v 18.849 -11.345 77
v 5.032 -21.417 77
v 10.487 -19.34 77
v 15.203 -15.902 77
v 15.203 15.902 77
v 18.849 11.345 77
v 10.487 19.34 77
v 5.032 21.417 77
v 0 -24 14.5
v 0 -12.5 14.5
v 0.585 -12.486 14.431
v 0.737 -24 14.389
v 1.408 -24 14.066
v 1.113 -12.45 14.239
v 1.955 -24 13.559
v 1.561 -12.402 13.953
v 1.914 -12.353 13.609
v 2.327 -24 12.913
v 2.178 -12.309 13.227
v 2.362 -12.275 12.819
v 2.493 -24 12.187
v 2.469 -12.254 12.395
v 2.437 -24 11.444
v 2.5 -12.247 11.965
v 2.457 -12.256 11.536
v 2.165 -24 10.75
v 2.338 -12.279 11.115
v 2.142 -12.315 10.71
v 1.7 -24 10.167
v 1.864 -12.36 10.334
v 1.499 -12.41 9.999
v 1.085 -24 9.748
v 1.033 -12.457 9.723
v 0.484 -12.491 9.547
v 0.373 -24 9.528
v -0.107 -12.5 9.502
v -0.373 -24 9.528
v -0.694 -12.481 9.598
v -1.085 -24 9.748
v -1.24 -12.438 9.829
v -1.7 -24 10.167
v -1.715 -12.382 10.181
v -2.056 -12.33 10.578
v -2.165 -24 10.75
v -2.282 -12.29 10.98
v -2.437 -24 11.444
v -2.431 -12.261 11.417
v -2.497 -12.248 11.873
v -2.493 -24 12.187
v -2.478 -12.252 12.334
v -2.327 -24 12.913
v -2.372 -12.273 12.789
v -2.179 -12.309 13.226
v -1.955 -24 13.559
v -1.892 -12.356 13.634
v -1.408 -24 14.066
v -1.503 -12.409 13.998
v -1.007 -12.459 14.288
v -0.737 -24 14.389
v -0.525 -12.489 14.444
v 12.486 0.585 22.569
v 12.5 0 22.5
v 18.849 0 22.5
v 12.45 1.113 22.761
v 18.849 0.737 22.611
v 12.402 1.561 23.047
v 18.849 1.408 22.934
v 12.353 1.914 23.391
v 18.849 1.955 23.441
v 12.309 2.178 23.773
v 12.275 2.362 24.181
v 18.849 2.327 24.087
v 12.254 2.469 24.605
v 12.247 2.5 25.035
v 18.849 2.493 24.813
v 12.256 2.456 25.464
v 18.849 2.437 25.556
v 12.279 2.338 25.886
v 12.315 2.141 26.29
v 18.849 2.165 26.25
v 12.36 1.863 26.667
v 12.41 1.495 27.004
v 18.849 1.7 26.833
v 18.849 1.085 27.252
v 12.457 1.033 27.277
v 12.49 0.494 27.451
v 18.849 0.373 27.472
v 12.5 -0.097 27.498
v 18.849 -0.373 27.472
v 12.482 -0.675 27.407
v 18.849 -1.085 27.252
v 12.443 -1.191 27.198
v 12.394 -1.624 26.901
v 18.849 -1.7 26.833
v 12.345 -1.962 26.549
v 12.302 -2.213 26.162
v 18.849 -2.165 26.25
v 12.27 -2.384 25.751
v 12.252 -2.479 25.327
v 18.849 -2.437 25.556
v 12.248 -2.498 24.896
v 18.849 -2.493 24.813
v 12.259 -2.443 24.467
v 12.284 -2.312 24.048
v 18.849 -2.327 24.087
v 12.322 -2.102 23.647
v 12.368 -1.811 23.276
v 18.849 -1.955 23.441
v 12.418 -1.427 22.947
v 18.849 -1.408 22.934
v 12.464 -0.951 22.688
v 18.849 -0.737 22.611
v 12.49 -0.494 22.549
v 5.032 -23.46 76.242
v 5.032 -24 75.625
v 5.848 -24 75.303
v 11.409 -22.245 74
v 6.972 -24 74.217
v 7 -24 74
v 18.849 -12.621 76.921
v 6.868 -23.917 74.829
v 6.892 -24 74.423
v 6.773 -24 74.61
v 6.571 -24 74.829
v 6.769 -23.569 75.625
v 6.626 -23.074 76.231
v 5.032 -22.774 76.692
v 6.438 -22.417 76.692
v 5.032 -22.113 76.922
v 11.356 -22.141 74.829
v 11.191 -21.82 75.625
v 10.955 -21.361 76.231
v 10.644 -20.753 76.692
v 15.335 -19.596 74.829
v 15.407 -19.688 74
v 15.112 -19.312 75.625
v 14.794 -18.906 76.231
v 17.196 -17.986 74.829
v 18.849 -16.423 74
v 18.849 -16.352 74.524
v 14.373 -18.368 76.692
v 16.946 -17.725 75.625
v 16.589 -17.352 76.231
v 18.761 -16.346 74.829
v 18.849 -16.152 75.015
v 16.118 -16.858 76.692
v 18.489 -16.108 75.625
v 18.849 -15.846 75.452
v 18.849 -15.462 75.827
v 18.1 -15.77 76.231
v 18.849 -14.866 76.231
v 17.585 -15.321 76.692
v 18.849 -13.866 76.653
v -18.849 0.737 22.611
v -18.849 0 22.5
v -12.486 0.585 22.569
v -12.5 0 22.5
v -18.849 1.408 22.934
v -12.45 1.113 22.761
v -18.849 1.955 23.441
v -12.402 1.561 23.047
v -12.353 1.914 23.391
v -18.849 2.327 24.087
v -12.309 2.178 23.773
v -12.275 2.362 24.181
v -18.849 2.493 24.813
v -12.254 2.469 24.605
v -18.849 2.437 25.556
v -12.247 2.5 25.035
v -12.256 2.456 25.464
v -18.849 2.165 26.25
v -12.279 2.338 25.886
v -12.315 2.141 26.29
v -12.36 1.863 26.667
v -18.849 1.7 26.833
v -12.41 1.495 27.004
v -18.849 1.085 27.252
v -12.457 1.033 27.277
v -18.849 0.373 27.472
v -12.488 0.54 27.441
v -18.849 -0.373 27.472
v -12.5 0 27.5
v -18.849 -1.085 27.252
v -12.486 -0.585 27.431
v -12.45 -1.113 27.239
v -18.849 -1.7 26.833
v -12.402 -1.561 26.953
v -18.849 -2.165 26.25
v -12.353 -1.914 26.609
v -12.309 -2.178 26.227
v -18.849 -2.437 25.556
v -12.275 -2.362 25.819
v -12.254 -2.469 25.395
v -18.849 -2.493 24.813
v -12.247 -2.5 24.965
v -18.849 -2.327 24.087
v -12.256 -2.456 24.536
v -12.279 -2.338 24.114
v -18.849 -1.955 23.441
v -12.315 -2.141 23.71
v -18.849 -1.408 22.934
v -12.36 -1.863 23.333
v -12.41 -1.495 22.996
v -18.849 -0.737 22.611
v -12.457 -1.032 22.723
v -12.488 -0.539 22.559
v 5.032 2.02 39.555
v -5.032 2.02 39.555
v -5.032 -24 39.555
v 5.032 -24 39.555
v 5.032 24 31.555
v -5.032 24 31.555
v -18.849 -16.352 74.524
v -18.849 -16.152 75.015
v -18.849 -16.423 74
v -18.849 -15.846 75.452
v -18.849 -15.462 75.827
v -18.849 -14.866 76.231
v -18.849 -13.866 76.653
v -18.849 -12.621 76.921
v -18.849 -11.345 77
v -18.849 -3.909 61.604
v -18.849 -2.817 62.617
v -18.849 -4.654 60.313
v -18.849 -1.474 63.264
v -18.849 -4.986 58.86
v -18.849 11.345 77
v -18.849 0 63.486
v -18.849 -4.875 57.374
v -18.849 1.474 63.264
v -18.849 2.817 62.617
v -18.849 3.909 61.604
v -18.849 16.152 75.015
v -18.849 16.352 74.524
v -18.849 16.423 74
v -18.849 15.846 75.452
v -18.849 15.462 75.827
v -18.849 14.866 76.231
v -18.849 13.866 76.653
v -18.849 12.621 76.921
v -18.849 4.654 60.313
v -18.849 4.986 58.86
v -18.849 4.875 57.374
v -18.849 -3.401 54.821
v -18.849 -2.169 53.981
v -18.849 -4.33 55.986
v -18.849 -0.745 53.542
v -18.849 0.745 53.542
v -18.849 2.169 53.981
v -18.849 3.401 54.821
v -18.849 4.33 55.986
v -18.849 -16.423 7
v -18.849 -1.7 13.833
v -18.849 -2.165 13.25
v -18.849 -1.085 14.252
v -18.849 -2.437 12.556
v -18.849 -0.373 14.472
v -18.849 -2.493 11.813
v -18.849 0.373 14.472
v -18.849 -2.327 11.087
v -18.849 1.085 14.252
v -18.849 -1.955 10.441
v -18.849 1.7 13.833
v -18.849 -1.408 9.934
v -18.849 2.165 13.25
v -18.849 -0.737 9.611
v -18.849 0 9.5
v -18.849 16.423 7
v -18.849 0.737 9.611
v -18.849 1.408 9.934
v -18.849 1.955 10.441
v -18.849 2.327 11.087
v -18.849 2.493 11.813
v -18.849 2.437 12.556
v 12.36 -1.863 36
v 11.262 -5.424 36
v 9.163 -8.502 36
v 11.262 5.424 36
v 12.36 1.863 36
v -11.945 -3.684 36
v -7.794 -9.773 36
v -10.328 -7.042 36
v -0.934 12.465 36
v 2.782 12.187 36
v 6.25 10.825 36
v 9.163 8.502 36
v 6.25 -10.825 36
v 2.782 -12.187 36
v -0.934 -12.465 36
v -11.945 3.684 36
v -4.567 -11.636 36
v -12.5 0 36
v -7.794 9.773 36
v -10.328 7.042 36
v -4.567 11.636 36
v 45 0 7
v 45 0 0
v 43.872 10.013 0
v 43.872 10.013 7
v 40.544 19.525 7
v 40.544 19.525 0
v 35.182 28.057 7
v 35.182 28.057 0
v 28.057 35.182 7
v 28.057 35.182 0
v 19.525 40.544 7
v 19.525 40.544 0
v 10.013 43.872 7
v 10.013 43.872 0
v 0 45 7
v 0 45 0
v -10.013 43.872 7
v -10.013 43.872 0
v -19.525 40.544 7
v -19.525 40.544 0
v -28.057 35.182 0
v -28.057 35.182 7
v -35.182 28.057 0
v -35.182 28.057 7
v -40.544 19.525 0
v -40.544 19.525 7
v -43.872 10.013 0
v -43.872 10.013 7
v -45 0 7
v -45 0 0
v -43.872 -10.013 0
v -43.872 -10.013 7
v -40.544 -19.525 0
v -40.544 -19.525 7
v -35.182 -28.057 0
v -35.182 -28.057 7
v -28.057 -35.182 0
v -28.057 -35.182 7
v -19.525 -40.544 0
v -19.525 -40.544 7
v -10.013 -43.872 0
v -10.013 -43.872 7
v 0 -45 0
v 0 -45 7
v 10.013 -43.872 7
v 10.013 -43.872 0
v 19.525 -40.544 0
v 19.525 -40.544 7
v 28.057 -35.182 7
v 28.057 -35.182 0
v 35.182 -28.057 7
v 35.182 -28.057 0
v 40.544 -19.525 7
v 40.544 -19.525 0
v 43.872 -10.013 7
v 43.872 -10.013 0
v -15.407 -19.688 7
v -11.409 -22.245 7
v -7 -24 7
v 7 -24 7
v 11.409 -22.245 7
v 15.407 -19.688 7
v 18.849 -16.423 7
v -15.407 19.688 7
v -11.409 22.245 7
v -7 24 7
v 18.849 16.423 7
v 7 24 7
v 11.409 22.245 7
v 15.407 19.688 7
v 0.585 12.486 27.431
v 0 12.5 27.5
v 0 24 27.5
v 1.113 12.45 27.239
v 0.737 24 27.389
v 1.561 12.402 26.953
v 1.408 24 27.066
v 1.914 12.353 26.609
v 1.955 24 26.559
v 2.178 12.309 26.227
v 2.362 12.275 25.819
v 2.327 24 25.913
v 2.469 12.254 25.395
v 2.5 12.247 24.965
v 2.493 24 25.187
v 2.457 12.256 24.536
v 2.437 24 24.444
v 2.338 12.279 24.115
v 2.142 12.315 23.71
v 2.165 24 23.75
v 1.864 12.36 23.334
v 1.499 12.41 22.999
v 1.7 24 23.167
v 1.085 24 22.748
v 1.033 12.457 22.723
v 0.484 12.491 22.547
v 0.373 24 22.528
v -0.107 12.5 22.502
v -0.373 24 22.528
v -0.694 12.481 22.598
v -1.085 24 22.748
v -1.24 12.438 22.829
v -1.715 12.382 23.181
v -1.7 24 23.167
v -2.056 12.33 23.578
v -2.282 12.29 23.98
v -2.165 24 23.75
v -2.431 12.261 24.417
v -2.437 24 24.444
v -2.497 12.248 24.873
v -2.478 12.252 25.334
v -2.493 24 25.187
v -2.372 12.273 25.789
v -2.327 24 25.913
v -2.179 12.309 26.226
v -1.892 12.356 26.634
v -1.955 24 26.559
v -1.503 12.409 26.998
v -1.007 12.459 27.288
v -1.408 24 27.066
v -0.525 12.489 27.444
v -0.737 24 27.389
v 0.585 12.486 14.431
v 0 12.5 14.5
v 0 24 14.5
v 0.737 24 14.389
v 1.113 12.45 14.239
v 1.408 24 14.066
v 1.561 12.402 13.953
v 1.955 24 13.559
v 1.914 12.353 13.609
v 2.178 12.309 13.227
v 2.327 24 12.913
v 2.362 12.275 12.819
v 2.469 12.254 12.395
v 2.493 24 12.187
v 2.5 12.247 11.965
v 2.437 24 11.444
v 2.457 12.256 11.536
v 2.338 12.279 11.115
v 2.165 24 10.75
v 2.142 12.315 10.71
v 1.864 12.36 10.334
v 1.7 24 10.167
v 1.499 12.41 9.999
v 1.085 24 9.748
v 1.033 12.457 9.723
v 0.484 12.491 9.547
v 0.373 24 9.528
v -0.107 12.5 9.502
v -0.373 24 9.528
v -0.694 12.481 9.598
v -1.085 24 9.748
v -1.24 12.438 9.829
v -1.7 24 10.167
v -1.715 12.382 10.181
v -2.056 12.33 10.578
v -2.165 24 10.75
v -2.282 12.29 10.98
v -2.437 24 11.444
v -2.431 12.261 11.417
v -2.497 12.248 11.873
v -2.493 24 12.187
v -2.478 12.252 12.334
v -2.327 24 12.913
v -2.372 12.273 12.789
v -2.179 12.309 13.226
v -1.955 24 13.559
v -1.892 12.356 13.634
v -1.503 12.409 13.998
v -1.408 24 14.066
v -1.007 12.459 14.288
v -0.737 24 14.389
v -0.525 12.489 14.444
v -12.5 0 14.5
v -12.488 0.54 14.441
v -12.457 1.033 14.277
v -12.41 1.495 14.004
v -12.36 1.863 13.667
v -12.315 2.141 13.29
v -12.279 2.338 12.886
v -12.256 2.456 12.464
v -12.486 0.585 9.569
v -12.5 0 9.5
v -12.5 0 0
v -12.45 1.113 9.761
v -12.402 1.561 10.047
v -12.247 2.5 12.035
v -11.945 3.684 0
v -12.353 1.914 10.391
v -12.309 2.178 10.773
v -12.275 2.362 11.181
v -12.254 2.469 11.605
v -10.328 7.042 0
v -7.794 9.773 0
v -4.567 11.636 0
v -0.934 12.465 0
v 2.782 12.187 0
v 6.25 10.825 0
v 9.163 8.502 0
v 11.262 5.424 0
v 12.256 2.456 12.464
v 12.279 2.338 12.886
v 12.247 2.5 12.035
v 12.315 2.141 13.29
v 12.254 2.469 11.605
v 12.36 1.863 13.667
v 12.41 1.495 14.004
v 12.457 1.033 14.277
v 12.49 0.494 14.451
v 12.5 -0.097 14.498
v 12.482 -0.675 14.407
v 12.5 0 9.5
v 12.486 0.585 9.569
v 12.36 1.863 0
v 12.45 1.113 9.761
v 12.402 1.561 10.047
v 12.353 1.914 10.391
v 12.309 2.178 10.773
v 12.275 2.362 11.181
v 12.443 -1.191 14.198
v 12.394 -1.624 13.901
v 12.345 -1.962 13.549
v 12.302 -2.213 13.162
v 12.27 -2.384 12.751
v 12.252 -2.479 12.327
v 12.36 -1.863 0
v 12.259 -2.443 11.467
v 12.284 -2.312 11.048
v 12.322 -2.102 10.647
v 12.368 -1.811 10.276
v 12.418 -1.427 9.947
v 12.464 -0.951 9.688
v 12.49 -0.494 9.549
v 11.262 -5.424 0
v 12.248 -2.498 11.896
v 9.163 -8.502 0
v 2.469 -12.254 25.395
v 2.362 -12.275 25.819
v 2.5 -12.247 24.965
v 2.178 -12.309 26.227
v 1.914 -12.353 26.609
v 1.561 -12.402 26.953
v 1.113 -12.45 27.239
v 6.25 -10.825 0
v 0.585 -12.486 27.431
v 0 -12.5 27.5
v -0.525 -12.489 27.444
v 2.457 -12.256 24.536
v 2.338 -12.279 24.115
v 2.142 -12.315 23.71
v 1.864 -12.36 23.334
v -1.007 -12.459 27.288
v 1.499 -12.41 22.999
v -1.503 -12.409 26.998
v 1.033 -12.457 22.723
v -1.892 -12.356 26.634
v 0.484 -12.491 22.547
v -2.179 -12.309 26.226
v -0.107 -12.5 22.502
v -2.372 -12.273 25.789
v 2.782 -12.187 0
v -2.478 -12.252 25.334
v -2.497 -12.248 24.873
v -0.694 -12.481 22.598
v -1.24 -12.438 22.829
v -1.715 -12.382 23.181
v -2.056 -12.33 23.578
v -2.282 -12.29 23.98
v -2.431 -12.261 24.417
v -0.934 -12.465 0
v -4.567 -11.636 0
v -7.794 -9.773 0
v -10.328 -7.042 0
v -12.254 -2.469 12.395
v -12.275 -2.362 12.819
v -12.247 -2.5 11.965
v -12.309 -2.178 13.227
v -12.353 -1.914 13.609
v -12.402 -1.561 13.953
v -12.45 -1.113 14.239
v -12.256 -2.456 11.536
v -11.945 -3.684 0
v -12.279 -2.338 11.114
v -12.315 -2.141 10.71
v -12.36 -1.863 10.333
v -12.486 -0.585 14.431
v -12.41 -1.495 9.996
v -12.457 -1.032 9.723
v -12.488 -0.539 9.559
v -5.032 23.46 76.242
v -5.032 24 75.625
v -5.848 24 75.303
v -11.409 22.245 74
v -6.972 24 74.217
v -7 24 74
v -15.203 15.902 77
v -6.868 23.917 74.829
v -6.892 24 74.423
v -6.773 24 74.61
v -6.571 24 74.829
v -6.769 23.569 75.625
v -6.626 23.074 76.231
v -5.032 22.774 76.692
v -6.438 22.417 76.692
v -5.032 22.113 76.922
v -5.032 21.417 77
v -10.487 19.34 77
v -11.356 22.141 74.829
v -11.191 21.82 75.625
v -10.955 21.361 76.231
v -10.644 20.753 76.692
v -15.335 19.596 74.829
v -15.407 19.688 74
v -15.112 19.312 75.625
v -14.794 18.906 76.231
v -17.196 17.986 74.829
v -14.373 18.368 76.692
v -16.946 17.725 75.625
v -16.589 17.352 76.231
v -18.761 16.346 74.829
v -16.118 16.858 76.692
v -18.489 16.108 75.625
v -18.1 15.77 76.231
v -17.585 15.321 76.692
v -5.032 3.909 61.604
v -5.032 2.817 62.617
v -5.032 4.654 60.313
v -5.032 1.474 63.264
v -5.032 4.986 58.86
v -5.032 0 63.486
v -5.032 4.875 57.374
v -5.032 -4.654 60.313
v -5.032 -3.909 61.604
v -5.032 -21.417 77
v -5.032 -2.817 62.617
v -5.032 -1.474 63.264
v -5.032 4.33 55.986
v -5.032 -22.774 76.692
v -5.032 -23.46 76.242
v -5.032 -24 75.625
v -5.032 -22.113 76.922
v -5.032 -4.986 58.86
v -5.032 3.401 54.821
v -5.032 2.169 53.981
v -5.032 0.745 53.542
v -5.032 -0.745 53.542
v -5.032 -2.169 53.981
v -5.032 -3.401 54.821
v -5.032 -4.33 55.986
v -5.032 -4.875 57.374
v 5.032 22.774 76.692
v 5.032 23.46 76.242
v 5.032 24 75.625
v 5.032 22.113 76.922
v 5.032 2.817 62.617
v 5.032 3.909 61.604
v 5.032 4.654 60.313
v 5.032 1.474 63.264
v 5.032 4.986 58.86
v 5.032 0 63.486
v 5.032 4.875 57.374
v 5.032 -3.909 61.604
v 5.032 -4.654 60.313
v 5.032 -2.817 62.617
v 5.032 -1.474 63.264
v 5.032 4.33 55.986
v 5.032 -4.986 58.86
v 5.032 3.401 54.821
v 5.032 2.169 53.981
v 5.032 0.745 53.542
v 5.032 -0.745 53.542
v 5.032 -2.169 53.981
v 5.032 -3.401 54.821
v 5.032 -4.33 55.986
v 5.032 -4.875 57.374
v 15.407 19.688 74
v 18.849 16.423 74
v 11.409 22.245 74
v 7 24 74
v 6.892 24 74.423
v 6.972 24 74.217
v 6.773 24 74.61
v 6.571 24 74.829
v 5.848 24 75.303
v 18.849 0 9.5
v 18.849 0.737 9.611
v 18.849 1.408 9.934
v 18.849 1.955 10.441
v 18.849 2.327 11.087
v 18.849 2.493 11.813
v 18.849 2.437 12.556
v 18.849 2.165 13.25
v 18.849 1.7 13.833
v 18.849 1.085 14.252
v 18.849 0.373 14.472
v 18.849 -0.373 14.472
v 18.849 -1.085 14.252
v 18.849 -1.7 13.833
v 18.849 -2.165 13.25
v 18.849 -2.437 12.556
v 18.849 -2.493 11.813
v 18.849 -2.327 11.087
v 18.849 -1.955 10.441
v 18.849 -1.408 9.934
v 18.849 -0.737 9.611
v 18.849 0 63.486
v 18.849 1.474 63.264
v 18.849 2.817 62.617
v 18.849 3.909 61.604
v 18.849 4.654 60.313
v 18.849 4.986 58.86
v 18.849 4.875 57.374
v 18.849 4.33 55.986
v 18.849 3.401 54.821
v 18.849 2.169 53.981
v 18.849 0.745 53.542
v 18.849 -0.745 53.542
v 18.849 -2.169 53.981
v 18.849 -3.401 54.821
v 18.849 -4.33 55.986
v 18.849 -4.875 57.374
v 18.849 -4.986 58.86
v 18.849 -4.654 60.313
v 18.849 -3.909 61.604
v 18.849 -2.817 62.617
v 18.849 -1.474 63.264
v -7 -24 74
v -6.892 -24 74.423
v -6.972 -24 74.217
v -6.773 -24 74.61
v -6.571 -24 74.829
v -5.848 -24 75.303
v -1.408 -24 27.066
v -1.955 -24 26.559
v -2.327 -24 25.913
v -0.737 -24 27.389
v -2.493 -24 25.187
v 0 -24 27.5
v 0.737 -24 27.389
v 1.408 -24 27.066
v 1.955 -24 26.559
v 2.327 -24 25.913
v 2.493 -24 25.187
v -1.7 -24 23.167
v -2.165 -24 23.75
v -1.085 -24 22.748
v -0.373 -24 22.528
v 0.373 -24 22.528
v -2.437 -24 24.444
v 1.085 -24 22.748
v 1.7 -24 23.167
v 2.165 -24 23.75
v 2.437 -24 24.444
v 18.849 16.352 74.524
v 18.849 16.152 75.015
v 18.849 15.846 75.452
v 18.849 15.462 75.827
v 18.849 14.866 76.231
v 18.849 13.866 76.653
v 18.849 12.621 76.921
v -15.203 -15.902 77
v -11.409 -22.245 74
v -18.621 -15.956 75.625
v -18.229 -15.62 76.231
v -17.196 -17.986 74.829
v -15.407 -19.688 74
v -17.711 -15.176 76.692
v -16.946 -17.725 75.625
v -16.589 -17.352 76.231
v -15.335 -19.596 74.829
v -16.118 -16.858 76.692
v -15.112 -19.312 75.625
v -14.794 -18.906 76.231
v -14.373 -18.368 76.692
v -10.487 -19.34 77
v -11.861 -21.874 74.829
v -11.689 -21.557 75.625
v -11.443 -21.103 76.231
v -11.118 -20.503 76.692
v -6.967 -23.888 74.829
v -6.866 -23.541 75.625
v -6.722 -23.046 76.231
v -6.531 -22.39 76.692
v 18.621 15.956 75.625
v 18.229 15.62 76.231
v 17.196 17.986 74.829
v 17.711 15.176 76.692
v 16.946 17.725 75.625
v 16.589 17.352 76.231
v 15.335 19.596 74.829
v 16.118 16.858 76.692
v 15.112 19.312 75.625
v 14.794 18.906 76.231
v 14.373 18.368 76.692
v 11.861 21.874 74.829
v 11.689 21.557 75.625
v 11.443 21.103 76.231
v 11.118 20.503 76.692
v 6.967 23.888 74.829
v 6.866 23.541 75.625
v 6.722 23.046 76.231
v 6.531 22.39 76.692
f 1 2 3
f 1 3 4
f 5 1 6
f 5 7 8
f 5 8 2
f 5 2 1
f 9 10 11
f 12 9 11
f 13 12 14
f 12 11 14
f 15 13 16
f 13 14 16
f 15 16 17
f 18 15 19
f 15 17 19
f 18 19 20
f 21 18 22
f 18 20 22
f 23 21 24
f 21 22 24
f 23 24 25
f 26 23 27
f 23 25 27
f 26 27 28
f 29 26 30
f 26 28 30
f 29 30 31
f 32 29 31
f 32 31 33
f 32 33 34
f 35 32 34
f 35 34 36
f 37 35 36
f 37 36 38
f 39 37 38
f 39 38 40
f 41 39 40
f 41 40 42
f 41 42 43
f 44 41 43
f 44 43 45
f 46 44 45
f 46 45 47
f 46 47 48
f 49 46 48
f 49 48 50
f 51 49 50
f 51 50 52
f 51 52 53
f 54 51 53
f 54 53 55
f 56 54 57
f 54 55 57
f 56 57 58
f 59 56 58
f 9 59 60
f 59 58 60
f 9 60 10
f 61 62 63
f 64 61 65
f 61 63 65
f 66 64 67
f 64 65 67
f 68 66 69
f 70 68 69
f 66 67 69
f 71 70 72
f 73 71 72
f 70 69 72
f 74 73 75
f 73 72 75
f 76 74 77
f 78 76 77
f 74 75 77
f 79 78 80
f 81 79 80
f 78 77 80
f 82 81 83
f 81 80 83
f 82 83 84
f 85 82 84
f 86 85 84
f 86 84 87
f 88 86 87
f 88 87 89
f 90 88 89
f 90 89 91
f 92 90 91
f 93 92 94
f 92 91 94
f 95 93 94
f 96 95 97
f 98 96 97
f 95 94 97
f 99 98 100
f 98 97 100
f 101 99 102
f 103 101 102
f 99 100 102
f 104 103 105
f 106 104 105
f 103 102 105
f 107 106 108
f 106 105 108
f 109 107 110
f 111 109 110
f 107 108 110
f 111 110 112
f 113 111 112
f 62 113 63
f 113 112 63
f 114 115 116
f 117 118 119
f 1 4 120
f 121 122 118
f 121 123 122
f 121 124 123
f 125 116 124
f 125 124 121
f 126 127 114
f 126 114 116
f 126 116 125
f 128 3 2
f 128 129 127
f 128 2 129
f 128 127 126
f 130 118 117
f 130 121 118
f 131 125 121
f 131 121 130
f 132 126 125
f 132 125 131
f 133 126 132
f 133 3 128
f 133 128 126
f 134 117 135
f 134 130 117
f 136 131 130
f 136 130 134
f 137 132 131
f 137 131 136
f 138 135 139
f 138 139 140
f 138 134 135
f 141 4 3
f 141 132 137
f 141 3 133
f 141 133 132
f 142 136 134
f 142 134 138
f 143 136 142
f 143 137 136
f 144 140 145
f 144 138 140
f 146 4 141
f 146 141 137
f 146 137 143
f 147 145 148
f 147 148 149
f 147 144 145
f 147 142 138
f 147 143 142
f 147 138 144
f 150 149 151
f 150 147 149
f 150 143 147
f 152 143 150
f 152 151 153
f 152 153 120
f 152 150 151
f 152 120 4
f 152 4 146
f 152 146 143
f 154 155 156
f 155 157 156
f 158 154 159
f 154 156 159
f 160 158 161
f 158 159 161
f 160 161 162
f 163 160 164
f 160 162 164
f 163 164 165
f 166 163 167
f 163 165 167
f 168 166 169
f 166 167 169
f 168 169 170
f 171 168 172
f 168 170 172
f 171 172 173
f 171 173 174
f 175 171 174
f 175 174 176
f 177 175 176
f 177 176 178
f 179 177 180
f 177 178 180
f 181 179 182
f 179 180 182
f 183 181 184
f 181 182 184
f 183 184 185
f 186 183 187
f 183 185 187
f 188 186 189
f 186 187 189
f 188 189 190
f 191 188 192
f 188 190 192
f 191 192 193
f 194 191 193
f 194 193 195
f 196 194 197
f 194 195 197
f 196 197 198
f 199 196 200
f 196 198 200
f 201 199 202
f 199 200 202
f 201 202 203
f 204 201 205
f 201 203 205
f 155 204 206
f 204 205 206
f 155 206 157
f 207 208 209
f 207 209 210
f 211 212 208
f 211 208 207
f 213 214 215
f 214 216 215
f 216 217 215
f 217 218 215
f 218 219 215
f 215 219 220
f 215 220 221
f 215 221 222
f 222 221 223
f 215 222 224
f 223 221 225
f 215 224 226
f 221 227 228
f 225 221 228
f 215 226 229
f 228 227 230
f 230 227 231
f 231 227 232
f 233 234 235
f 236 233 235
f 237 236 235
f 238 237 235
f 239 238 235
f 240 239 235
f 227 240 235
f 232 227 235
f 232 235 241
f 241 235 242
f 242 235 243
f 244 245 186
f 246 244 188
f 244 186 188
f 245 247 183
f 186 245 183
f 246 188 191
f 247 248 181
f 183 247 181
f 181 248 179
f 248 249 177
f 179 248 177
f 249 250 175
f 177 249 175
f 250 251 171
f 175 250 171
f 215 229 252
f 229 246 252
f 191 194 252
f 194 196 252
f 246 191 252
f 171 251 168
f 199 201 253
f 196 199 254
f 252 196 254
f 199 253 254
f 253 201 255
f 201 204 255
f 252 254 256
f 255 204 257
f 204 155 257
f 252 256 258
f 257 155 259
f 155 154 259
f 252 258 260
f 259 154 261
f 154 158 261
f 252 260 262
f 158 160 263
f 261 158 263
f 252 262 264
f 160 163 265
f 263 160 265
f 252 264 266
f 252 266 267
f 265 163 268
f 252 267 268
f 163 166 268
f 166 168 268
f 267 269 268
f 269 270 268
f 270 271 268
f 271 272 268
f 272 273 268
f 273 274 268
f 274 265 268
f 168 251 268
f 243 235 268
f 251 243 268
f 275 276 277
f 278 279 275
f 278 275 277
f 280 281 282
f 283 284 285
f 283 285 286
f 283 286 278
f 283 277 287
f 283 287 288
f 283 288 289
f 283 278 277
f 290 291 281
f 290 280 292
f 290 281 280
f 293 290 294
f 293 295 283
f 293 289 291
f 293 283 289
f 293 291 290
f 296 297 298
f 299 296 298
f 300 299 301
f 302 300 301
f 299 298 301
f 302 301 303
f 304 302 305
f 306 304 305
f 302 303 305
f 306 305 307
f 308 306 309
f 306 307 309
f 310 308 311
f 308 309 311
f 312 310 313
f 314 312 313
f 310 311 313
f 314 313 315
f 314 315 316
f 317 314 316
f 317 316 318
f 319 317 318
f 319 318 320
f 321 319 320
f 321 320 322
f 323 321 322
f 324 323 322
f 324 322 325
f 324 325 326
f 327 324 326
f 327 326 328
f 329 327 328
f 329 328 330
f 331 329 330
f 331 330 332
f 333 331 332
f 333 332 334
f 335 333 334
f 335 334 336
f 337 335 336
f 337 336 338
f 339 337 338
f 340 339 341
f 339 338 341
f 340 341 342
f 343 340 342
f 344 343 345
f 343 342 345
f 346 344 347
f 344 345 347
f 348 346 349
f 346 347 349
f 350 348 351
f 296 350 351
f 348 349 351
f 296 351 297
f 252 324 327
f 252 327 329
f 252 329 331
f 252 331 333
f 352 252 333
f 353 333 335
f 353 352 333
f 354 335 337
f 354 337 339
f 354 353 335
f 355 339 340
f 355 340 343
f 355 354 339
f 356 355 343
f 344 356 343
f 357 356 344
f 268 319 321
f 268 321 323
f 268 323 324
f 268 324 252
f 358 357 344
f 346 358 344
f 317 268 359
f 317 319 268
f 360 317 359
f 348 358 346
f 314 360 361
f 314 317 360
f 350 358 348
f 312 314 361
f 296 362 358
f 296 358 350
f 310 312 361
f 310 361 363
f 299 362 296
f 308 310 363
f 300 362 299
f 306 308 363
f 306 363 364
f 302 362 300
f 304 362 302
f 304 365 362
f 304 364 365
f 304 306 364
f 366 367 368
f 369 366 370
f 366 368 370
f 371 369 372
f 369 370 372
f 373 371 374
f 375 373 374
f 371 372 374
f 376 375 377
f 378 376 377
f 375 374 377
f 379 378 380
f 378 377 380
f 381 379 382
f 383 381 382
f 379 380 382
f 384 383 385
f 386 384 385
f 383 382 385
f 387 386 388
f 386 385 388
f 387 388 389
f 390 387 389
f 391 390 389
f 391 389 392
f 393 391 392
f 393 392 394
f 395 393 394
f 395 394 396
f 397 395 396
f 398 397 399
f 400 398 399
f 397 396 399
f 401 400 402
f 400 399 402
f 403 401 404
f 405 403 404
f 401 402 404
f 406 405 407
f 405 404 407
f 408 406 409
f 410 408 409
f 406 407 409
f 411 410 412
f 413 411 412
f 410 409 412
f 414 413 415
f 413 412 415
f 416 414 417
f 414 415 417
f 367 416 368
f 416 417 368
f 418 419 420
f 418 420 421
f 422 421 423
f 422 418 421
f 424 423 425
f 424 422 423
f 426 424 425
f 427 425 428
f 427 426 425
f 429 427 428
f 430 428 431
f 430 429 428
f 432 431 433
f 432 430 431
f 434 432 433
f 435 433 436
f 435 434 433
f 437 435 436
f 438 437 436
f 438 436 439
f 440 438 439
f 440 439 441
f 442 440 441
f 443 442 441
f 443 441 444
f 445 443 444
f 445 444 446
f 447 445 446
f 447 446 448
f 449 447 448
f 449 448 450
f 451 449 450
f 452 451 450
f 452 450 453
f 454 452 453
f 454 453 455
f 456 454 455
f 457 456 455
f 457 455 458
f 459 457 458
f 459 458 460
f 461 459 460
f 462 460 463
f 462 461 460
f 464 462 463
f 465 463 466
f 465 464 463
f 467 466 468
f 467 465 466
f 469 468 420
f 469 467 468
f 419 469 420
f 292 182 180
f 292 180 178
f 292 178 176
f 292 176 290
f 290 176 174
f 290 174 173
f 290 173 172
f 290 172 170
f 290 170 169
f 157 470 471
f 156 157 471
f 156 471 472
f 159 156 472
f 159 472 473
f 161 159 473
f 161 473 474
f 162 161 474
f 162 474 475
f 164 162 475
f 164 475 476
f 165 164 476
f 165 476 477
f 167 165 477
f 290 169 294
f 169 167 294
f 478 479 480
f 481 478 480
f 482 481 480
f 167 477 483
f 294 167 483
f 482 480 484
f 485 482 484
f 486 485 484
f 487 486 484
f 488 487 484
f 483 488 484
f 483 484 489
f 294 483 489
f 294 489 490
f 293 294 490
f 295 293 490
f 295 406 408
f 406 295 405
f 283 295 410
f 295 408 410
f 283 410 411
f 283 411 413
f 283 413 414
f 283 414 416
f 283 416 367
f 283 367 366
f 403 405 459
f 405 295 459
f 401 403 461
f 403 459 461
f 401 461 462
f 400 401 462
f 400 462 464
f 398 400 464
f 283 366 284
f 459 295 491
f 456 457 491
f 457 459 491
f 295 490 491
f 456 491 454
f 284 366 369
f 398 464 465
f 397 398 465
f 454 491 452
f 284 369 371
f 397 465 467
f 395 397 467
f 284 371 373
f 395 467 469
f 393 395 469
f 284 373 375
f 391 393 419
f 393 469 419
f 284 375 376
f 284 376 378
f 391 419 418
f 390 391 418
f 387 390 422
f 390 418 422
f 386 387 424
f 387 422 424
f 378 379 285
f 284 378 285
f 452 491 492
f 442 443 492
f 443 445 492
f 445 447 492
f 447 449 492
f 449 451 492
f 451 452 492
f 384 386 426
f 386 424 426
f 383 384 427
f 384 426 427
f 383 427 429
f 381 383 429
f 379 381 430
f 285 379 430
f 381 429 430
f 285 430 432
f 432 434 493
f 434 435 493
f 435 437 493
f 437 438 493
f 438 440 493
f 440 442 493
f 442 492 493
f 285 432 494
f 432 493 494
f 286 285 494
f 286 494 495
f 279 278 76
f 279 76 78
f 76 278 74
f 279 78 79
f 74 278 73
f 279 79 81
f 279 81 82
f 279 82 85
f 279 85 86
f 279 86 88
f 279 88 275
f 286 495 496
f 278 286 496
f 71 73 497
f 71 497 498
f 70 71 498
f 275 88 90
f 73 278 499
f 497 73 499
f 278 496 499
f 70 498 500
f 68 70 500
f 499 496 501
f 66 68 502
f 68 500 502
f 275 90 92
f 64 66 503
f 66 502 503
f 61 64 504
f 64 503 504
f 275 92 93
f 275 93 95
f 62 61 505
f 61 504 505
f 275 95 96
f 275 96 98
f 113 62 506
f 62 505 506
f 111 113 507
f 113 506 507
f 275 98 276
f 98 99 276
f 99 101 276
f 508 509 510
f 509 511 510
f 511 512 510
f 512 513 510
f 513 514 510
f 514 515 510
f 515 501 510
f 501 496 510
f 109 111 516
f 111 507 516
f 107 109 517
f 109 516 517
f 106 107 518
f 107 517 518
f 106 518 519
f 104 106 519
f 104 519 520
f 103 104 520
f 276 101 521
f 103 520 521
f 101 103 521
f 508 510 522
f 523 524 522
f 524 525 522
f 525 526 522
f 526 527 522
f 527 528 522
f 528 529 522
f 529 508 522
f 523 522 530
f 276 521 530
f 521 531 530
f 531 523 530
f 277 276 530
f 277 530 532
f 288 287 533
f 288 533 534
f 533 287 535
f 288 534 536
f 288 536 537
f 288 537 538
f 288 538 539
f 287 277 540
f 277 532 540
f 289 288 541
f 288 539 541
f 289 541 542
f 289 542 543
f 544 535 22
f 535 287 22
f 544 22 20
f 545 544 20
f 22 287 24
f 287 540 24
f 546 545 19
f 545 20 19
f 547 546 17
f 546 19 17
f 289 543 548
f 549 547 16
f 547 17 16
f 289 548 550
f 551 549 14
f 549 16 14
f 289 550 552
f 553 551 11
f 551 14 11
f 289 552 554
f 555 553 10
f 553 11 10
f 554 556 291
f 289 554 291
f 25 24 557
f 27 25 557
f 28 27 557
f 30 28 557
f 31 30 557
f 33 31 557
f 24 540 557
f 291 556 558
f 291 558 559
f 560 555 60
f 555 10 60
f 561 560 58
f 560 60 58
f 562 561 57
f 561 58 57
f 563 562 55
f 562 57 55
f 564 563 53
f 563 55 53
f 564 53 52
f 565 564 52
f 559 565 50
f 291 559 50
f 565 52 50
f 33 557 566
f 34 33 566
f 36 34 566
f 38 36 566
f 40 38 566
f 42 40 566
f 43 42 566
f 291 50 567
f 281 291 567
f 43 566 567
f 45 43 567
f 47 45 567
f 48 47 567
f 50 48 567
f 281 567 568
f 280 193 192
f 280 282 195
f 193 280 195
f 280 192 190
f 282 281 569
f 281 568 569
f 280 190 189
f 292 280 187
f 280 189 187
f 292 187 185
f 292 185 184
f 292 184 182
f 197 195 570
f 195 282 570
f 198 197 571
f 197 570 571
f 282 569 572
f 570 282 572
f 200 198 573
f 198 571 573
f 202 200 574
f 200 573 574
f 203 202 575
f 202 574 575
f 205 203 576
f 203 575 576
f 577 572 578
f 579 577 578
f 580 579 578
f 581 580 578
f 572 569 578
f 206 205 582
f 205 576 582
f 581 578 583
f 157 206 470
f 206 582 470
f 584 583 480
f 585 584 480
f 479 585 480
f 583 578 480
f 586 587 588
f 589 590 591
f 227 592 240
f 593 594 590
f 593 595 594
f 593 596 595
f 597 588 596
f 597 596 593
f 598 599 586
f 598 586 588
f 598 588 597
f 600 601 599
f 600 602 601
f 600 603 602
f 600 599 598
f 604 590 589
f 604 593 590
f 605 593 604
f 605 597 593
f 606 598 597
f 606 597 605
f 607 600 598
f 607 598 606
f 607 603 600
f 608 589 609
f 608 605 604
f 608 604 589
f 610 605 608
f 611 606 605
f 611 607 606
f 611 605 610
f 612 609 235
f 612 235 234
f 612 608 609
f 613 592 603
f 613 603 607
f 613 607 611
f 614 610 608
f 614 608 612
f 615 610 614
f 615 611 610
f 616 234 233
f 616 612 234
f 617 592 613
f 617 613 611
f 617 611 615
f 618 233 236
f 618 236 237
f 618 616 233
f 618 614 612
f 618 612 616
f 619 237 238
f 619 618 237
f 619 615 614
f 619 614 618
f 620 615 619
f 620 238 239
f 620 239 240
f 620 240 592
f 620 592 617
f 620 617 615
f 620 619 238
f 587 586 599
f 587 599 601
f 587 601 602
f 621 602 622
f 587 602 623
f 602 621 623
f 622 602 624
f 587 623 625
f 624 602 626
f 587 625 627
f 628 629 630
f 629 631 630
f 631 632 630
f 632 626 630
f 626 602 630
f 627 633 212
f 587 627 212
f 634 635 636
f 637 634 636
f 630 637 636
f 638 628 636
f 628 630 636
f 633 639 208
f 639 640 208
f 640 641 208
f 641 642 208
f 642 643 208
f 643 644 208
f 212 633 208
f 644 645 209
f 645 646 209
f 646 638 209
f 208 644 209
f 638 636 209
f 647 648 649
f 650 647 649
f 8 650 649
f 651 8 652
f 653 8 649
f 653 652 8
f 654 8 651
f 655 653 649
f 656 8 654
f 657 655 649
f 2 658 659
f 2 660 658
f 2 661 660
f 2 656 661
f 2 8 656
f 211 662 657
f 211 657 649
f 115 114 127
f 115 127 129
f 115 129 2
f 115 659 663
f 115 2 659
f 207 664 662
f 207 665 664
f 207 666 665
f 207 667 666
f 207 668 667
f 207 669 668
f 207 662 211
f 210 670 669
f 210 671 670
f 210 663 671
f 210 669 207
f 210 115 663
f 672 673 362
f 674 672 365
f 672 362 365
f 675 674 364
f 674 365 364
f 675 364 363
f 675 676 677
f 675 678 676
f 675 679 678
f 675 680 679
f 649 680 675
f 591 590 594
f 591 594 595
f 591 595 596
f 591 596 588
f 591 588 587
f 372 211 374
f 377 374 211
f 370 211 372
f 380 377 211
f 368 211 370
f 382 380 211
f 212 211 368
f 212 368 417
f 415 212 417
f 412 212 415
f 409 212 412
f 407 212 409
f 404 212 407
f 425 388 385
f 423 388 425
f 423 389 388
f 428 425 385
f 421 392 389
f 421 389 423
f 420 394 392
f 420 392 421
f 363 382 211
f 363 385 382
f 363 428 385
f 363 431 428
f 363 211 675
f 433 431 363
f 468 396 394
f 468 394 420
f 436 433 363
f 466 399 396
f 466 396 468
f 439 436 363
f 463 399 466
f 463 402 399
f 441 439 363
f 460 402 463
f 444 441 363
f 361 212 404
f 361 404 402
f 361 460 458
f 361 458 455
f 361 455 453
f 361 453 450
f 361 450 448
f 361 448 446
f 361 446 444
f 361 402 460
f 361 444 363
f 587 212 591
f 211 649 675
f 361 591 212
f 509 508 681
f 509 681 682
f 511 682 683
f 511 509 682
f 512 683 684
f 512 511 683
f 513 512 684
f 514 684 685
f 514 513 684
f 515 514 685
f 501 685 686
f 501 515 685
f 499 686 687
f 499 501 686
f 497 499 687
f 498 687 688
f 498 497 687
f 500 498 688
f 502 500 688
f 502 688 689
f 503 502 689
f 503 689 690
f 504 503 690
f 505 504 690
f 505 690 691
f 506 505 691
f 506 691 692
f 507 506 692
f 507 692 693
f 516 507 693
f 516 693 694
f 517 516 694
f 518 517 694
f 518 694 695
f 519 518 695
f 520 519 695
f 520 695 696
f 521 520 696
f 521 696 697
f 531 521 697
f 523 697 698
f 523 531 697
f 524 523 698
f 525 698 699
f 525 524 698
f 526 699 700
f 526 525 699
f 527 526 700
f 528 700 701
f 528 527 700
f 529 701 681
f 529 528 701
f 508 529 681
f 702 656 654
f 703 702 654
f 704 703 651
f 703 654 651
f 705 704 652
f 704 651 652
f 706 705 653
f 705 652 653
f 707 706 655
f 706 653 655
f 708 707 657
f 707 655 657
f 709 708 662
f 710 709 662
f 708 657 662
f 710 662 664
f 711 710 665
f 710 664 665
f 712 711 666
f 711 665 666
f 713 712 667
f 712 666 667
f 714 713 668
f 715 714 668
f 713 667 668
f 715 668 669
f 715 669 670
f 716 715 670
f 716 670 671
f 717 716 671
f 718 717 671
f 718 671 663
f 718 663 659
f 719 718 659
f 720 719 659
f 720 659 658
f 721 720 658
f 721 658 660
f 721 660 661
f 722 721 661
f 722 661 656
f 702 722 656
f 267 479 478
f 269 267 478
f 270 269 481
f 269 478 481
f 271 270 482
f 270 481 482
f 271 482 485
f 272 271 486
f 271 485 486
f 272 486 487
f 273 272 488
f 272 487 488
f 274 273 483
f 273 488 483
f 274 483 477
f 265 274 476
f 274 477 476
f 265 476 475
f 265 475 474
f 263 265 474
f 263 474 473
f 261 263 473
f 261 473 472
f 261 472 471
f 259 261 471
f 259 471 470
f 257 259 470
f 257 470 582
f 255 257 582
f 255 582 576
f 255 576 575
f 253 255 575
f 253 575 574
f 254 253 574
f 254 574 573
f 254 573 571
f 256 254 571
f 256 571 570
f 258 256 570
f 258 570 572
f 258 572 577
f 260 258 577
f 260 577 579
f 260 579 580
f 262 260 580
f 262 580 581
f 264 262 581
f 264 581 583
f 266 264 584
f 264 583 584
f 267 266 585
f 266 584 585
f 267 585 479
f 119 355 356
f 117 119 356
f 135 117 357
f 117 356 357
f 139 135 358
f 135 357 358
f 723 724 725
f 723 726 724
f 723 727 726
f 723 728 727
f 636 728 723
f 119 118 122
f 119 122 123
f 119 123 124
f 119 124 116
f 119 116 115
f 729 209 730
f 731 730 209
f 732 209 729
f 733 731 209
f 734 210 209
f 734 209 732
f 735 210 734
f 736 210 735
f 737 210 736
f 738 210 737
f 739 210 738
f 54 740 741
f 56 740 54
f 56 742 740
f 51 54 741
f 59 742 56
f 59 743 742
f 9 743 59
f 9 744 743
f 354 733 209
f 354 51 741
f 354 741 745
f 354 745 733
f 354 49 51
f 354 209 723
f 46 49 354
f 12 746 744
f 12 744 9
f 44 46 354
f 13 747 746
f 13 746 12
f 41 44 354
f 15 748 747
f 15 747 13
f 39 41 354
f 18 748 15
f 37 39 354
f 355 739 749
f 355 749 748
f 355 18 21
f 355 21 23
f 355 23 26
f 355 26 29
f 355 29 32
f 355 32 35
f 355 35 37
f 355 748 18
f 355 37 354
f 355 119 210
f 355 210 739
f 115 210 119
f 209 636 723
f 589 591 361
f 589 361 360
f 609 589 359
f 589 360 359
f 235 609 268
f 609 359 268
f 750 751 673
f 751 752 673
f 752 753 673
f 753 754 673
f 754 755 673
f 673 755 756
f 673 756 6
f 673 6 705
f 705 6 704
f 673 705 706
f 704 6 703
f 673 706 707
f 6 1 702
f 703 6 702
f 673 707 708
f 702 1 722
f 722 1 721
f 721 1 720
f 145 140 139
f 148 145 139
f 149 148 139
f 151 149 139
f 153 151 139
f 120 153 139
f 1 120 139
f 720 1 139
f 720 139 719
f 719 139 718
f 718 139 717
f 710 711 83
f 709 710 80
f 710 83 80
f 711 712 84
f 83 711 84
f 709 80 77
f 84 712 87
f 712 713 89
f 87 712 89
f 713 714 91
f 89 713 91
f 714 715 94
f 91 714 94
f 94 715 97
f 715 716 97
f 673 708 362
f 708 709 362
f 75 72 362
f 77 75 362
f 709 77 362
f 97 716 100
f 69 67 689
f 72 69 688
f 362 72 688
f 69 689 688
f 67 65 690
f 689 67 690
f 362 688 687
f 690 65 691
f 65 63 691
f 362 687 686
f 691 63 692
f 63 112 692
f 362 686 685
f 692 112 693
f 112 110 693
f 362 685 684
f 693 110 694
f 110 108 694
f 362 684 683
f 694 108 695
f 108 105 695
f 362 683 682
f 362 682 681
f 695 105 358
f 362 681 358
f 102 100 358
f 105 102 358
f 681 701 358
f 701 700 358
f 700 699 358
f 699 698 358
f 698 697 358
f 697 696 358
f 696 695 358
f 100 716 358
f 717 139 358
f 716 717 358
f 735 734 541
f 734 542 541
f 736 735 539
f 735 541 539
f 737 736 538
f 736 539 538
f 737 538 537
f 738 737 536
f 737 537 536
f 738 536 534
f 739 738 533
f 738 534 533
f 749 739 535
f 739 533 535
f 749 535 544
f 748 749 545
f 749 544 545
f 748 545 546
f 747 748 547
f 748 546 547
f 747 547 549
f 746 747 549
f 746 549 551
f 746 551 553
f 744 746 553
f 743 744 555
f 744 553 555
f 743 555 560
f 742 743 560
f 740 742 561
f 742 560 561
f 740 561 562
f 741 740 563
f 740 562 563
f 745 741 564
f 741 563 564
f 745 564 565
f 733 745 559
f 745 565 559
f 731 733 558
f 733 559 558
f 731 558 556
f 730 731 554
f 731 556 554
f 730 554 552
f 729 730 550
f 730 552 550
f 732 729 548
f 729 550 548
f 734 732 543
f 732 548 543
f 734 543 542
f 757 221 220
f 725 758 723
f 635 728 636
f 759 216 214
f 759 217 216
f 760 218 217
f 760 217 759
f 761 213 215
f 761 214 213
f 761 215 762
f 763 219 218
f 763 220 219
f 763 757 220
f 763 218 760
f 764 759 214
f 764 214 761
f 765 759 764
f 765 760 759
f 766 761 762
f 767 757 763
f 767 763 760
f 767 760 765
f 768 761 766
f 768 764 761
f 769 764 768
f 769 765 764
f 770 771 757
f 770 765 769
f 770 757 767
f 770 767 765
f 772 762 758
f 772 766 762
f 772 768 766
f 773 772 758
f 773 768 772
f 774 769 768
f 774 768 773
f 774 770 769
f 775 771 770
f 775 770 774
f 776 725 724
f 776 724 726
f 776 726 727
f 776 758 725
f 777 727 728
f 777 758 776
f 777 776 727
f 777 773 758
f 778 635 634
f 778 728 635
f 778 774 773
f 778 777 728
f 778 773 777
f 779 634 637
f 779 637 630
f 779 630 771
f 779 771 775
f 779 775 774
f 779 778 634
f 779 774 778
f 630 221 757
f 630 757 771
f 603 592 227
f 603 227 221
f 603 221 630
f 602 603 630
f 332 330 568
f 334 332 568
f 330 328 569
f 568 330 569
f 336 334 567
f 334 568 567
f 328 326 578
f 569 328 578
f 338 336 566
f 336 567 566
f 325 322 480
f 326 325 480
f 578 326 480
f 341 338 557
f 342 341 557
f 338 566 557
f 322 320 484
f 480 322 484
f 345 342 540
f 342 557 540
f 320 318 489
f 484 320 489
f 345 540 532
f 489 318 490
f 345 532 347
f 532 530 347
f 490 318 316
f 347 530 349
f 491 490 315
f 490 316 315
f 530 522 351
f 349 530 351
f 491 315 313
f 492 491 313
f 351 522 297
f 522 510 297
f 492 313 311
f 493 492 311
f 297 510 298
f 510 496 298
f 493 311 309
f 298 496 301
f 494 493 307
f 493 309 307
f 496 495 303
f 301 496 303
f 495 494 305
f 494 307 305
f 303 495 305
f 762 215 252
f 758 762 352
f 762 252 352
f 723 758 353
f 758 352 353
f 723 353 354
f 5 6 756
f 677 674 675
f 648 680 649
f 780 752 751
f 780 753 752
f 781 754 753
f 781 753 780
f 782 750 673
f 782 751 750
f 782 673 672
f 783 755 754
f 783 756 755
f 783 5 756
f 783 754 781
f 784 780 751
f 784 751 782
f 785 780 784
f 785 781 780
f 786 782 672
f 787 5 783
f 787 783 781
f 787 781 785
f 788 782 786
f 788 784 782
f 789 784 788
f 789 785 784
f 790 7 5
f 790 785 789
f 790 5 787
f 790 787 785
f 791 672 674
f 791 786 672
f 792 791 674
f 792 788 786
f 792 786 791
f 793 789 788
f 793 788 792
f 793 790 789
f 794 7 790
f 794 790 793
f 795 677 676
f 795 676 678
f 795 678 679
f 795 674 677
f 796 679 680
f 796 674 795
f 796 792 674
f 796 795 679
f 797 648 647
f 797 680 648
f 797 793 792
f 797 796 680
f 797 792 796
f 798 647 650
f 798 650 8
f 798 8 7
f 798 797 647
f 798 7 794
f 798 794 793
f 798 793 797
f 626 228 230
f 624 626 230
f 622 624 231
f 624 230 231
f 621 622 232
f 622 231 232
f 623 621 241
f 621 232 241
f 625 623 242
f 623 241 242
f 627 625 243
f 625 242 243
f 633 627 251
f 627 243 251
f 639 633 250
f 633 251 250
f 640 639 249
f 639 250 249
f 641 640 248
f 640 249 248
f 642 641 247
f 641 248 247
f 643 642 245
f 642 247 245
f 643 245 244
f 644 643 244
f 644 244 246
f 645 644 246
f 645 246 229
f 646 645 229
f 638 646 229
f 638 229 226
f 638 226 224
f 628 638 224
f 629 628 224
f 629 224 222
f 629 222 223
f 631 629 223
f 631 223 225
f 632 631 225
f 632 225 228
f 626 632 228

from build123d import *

# Parameters (mm, degrees)
SKETCH_1_R          = 45
EXTRUDE_1_DEPTH     = 7
SKETCH_2_R          = 25
EXTRUDE_2_DEPTH     = 70
FILLET_1_R          = 3
SKETCH_3_R          = 2.5
CUT_EXTRUDE_3_DEPTH = 35
SKETCH_5_R          = 2.5
CUT_EXTRUDE_4_DEPTH = 35
SKETCH_6_R          = 12.5
CUT_EXTRUDE_5_DEPTH = 36
SKETCH_7_W          = 10.064755008
SKETCH_7_H          = 68.890859038
SKETCH_7_W_2        = 9.000001362
SKETCH_7_H_2        = 72.567998157
CUT_EXTRUDE_6_DEPTH = 35
SKETCH_9_W          = 74.471064375
SKETCH_9_H          = 8.374114708
CUT_EXTRUDE_8_DEPTH = 35
SKETCH_10_R         = 5
CUT_EXTRUDE_1_DEPTH = 110.684759554
CHAMFER_1_SIZE      = 8
CHAMFER_1_SIZE2     = 21.979819356


with BuildPart() as part:
    # Эскиз1 → Вытянуть1 (new body)
    with BuildSketch(Plane.XY):
        Circle(SKETCH_1_R)
    extrude(amount=EXTRUDE_1_DEPTH)

    # Эскиз2 → Вытянуть2 (add)
    with BuildSketch(Plane.XY.offset(7)):
        Circle(SKETCH_2_R)
    extrude(amount=EXTRUDE_2_DEPTH)

    # Скругление1
    fillet_1_edges = [part.edges().sort_by_distance(p)[0] for p in [
        (-25, 0, 77),
    ]]
    fillet(fillet_1_edges, radius=FILLET_1_R)

    # Эскиз3 → Вытянуть3 (cut, symmetric)
    with BuildSketch(Plane(origin=(0, 0, 0), x_dir=(1, 0, 0), z_dir=(0, 1, 0))):
        with Locations(Location((0, -12, 0), (0, 0, 270))):
            Circle(SKETCH_3_R)
        with Locations(Location((0, -25, 0), (0, 0, 270))):
            Circle(SKETCH_3_R)
    extrude(amount=CUT_EXTRUDE_3_DEPTH, both=True, mode=Mode.SUBTRACT)

    # Эскиз5 → Вытянуть4 (cut, symmetric)
    with BuildSketch(Plane(origin=(0, 0, 0), x_dir=(0, 0, -1), z_dir=(1, 0, 0))):
        with Locations((-12, 0)):
            Circle(SKETCH_5_R)
        with Locations((-25, 0)):
            Circle(SKETCH_5_R)
    extrude(amount=CUT_EXTRUDE_4_DEPTH, both=True, mode=Mode.SUBTRACT)

    # Эскиз6 → Вытянуть5 (cut)
    with BuildSketch(Plane(origin=(0, 0, 0), x_dir=(-1, 0, 0), z_dir=(0, 0, -1))):
        Circle(SKETCH_6_R)
    extrude(amount=-CUT_EXTRUDE_5_DEPTH, mode=Mode.SUBTRACT)

    # Эскиз7 → Вытянуть6 (cut, symmetric)
    with BuildSketch(Plane(origin=(0, 0, 0), x_dir=(1, 0, 0), z_dir=(0, 1, 0))):
        with Locations((0, -74)):
            Rectangle(SKETCH_7_W, SKETCH_7_H)
        with Locations((23.349405244, -43.283999079)):
            Rectangle(SKETCH_7_W_2, SKETCH_7_H_2)
        with Locations((-23.349405244, -43.283999079)):
            Rectangle(SKETCH_7_W_2, SKETCH_7_H_2)
    extrude(amount=CUT_EXTRUDE_6_DEPTH, both=True, mode=Mode.SUBTRACT)

    # Эскиз9 → Вытянуть8 (cut, symmetric)
    with BuildSketch(Plane(origin=(0, 0, 0), x_dir=(0, 0, -1), z_dir=(1, 0, 0))):
        with Locations((-44.235532188, 28.187057354)):
            Rectangle(SKETCH_9_W, SKETCH_9_H)
        with Locations((-44.235532188, -28.187057354)):
            Rectangle(SKETCH_9_W, SKETCH_9_H)
    extrude(amount=CUT_EXTRUDE_8_DEPTH, both=True, mode=Mode.SUBTRACT)

    # Эскиз10 → Вырез-Вытянуть1 (cut, through all)
    with BuildSketch(Plane.ZY.offset(18.849404563)):
        with Locations((58.486255415, 0)):
            Circle(SKETCH_10_R)
    extrude(amount=-CUT_EXTRUDE_1_DEPTH, mode=Mode.SUBTRACT)

    # Фаска1
    chamfer_1_edges = [part.edges().sort_by_distance(p)[0] for p in [
        (0, 24, 39.554570481),
    ]]
    chamfer_1_side = [part.faces().sort_by_distance(p)[0] for p in [
        (0, 24, 32.18588004),
    ]]
    chamfer(chamfer_1_edges, length=CHAMFER_1_SIZE, length2=CHAMFER_1_SIZE2, reference=chamfer_1_side[0])


solid = part.part
